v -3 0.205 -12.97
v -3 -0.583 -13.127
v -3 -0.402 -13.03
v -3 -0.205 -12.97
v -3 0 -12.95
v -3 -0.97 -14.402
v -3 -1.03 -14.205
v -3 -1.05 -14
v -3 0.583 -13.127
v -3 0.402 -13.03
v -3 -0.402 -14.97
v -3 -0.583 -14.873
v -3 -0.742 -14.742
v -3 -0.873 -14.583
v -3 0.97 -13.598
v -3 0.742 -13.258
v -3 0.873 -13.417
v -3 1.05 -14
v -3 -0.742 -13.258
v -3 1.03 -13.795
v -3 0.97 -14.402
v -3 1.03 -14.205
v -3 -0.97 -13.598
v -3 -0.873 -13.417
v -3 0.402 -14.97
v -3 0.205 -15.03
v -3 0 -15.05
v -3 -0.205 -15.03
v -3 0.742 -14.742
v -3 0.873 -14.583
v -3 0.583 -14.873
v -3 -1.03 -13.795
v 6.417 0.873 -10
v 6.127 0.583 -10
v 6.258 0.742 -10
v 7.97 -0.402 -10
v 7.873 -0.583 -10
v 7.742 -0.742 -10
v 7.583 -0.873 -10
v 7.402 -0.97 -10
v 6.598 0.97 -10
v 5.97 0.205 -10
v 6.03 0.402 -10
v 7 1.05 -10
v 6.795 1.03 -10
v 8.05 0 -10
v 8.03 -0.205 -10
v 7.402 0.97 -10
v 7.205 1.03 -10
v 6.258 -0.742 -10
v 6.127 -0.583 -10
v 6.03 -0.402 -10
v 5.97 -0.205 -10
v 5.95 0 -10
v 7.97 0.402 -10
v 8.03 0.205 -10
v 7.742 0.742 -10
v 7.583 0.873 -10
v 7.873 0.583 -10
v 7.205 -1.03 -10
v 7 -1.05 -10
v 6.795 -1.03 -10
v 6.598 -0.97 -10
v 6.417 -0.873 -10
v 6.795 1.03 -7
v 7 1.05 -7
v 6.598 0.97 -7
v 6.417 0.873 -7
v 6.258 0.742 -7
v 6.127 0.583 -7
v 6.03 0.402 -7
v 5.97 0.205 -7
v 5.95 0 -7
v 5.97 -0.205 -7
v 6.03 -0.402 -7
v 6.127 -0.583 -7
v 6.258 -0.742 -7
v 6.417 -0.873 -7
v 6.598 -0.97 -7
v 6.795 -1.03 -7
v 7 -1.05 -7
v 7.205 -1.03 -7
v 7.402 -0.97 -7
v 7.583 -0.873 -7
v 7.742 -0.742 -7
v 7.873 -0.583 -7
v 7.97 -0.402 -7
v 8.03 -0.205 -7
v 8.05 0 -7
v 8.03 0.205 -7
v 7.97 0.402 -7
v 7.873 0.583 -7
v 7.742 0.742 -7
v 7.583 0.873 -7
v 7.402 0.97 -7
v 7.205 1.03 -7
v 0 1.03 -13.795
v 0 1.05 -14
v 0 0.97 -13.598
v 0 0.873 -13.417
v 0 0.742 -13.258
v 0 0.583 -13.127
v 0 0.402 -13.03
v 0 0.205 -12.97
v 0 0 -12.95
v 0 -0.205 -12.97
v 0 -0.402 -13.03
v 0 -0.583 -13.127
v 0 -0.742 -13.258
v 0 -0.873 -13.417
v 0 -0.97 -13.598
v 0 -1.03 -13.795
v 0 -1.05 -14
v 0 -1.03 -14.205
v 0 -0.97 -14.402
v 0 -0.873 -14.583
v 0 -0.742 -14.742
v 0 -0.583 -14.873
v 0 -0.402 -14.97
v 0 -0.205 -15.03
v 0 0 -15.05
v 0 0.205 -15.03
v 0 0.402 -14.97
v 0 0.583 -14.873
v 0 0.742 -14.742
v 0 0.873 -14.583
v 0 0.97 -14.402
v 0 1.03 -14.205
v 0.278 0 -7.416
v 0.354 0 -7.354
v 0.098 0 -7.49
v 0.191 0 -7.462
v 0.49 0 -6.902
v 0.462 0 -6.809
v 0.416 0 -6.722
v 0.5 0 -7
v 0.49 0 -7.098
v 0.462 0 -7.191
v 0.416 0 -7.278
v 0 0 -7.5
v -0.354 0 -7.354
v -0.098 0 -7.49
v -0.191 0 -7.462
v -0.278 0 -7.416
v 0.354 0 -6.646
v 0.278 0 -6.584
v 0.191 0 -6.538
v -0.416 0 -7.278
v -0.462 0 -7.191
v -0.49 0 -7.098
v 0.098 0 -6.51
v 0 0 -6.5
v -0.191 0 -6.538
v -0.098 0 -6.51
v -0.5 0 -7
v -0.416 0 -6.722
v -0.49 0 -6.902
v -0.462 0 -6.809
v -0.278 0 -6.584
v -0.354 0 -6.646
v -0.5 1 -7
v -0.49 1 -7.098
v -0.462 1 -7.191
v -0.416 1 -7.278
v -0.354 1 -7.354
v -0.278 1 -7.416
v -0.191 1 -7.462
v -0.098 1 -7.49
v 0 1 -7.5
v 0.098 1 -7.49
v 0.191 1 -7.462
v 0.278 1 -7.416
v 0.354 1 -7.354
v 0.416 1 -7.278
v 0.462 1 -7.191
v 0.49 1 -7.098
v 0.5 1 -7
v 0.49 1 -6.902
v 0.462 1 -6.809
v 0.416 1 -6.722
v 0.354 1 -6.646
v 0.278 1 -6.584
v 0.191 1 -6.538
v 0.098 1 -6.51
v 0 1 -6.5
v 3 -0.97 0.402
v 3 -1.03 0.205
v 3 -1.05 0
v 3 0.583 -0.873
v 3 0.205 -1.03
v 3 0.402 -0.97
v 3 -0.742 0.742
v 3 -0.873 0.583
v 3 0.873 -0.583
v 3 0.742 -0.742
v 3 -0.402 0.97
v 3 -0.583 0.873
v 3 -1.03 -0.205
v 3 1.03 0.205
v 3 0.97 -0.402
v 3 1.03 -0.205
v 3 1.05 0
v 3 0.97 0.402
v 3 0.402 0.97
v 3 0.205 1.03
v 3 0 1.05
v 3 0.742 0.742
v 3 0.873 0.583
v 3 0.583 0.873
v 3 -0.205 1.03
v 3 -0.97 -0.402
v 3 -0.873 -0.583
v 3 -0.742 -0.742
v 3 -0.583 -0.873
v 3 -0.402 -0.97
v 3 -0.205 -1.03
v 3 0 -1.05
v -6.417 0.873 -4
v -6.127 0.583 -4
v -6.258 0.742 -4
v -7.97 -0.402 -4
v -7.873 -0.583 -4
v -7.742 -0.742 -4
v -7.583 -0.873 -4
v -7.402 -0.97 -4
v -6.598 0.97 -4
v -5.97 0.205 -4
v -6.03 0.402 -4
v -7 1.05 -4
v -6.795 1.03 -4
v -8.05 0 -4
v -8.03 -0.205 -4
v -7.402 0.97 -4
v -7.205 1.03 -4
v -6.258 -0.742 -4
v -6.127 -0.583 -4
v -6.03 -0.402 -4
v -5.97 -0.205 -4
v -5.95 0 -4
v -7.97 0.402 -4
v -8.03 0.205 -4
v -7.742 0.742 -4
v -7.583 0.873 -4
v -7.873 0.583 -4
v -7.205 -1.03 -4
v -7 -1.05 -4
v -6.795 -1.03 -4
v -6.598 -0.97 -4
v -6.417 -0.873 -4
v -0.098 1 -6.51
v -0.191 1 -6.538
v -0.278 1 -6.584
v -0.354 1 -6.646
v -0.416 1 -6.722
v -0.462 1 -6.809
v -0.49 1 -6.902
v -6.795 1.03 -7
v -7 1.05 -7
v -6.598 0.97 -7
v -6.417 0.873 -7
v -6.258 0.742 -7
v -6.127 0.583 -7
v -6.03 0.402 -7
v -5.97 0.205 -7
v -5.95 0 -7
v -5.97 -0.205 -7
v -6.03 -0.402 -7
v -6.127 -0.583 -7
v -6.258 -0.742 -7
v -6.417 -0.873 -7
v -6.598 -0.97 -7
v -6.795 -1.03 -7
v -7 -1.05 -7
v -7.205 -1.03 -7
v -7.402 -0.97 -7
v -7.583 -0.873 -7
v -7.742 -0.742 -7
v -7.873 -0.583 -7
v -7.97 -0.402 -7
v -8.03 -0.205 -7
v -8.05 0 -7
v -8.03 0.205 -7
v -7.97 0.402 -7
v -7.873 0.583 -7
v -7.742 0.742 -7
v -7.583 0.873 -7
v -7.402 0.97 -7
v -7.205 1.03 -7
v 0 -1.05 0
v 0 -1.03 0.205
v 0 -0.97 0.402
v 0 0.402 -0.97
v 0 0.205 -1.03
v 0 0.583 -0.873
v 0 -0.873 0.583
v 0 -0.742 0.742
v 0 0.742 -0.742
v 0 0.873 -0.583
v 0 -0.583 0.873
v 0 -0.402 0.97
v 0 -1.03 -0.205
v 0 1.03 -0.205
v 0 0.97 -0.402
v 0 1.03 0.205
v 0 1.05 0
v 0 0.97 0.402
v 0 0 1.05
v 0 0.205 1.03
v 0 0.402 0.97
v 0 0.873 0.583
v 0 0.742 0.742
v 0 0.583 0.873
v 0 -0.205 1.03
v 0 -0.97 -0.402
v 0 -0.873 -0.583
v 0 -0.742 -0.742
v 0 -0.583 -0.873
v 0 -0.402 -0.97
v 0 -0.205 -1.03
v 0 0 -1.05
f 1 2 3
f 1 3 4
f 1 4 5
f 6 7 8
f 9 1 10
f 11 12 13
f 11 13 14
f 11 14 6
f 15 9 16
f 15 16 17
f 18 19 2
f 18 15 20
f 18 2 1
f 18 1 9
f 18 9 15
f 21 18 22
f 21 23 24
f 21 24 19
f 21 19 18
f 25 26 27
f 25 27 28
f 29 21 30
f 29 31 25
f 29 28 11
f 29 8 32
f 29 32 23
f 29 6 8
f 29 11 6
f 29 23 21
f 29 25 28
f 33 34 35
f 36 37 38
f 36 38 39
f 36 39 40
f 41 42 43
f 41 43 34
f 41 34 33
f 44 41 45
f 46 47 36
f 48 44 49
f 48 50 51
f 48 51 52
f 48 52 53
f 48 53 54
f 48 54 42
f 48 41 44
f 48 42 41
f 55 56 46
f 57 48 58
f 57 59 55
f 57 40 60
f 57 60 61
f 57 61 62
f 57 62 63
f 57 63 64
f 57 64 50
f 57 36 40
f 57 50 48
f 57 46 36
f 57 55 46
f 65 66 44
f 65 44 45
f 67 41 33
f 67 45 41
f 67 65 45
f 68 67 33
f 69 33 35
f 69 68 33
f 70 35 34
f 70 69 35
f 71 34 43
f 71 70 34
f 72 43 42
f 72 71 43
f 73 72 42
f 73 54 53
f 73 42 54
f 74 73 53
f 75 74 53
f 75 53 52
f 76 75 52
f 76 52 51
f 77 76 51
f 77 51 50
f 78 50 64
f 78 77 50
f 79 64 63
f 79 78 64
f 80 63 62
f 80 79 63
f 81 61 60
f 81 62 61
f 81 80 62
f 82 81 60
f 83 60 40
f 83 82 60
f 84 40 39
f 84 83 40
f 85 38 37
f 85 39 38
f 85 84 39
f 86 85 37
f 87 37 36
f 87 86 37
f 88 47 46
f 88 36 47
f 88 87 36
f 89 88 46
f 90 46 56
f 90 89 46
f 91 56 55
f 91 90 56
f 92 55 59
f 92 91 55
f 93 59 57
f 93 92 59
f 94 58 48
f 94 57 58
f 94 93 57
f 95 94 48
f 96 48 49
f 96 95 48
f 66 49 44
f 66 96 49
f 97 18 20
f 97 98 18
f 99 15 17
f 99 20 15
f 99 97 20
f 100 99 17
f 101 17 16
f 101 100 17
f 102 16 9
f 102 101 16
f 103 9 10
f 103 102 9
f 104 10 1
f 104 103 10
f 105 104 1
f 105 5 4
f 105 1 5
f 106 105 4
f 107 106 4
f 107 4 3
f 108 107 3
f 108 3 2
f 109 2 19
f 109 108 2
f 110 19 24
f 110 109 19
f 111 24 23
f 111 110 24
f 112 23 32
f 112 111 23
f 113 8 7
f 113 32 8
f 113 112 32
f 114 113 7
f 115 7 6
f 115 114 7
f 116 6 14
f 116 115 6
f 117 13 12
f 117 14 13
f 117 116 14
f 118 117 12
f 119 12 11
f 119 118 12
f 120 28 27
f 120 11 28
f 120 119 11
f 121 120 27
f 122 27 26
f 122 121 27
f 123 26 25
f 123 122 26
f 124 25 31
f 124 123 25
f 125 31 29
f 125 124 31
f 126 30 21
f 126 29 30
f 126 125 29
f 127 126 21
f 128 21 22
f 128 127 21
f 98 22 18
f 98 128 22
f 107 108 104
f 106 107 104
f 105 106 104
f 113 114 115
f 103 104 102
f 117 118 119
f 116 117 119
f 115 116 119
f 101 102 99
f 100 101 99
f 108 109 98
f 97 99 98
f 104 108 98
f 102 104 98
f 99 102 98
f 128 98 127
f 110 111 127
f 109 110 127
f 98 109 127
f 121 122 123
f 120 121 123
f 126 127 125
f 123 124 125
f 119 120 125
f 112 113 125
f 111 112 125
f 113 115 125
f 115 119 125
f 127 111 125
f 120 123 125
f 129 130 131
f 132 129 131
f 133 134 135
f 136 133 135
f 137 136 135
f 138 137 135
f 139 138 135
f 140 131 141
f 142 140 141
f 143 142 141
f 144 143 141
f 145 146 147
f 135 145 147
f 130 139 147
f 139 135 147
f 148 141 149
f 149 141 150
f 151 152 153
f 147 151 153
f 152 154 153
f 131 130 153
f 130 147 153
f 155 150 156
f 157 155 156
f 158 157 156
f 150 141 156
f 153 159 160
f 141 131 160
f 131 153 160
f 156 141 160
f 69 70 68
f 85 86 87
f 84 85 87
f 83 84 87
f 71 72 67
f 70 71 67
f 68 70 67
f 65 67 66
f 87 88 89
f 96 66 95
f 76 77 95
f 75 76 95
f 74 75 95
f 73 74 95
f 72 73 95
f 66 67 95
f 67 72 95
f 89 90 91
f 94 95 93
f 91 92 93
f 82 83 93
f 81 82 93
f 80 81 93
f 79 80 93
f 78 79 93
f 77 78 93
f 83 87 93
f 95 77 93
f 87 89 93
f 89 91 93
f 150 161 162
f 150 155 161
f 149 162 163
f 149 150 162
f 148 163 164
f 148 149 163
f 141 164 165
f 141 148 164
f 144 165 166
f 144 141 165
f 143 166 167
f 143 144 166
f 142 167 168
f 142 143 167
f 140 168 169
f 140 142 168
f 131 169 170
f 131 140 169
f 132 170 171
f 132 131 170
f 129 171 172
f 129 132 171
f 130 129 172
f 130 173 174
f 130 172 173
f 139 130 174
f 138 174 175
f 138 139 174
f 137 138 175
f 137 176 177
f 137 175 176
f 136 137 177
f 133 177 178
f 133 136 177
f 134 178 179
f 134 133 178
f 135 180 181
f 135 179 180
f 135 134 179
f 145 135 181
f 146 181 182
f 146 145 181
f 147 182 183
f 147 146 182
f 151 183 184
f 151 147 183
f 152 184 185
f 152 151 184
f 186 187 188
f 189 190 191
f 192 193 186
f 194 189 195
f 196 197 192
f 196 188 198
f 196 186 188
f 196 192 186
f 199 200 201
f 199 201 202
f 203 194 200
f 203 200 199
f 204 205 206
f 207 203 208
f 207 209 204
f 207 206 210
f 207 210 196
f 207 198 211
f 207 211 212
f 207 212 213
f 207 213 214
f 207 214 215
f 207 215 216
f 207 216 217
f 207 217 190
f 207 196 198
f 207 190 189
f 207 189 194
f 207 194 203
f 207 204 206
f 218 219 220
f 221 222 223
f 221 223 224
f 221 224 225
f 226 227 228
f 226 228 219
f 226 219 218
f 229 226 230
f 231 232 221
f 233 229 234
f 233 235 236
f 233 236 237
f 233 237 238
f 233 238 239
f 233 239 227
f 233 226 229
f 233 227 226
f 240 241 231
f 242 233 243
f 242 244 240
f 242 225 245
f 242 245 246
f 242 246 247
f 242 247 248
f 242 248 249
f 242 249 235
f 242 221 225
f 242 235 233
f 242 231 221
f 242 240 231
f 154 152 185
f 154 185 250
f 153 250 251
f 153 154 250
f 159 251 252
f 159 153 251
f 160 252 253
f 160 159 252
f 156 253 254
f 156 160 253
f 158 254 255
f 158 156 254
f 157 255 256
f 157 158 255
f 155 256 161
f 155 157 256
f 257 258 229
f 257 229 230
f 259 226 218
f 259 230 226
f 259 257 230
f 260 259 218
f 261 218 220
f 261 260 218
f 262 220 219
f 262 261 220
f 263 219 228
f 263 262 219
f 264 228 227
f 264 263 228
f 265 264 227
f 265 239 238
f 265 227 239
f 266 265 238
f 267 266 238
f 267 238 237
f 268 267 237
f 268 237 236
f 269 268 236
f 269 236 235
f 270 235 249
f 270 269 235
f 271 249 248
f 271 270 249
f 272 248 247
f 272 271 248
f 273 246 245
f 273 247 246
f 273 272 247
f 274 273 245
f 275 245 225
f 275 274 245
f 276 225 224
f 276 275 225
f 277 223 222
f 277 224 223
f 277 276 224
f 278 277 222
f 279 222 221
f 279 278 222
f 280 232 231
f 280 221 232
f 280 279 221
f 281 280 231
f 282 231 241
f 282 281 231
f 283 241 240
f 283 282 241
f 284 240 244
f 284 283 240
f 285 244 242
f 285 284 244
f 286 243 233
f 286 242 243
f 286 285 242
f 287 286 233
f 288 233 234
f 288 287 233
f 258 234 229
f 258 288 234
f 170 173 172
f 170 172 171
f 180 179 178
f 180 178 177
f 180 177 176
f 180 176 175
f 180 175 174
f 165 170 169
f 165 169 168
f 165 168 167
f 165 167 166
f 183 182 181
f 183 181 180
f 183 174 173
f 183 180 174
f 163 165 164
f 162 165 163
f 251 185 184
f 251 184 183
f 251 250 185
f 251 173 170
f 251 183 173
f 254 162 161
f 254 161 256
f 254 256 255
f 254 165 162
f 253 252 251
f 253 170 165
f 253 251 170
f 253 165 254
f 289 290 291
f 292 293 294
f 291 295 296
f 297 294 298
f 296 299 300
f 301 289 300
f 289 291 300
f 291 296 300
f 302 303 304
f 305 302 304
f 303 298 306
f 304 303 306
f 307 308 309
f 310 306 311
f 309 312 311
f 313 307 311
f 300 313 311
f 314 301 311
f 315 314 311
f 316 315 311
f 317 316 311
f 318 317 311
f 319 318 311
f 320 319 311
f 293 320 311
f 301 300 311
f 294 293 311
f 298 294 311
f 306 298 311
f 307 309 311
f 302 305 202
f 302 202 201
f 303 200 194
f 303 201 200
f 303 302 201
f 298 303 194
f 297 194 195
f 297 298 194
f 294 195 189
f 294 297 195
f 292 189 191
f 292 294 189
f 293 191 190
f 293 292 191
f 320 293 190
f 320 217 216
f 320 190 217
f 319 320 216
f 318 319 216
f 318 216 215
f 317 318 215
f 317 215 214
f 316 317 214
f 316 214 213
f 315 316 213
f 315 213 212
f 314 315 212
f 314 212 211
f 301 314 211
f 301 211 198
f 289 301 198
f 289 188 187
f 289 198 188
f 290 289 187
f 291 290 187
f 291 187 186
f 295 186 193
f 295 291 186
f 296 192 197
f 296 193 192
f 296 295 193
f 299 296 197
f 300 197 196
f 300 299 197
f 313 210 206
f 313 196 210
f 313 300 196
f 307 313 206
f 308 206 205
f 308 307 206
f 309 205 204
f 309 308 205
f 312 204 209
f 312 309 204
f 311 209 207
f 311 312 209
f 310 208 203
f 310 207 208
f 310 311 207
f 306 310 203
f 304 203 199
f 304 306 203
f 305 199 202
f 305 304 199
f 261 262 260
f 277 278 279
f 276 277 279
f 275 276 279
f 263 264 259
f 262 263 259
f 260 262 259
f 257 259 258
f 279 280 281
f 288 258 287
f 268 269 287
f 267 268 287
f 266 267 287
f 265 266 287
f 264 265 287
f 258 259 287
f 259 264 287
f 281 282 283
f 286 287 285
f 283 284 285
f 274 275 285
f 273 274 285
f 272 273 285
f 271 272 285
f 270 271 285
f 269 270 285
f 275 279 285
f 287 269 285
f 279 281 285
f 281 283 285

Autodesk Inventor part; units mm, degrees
ref_plane "YZ Plane" through (0, 0, 0) normal (1, 0, 0) x (0, 1, 0)
ref_plane "XZ Plane" through (0, 0, 0) normal (0, 1, 0) x (-1, 0, 0)
ref_plane "XY Plane" through (0, 0, 0) normal (0, 0, 1) x (1, 0, 0)
sketch "Sketch1" plane through (0, 0, 0) normal (1, 0, 0) x (0, 1, 0)
  circle A0 centre (0, 0) radius 1.05
  dimension "d0" = 2.1
extrude "Extrusion1" add sketch "Sketch1" along normal blind 3
sketch "Sketch2" plane through (0, 0, 0) normal (0, 1, 0) x (-1, 0, 0)
  line L0 (0, 0) -> (0, -7)
  circle A0 centre (0, -7) radius 0.5
  dimension "d3" = 7
  dimension "d4" = 1
extrude "Extrusion2" add sketch "Sketch2" along normal blind 1
pattern_circular "Circular Pattern1" count 4 over 360 about axis through (0, 0, -7) along (0, 1, 0) of "Extrusion1"
properties part number "inner_ring"
